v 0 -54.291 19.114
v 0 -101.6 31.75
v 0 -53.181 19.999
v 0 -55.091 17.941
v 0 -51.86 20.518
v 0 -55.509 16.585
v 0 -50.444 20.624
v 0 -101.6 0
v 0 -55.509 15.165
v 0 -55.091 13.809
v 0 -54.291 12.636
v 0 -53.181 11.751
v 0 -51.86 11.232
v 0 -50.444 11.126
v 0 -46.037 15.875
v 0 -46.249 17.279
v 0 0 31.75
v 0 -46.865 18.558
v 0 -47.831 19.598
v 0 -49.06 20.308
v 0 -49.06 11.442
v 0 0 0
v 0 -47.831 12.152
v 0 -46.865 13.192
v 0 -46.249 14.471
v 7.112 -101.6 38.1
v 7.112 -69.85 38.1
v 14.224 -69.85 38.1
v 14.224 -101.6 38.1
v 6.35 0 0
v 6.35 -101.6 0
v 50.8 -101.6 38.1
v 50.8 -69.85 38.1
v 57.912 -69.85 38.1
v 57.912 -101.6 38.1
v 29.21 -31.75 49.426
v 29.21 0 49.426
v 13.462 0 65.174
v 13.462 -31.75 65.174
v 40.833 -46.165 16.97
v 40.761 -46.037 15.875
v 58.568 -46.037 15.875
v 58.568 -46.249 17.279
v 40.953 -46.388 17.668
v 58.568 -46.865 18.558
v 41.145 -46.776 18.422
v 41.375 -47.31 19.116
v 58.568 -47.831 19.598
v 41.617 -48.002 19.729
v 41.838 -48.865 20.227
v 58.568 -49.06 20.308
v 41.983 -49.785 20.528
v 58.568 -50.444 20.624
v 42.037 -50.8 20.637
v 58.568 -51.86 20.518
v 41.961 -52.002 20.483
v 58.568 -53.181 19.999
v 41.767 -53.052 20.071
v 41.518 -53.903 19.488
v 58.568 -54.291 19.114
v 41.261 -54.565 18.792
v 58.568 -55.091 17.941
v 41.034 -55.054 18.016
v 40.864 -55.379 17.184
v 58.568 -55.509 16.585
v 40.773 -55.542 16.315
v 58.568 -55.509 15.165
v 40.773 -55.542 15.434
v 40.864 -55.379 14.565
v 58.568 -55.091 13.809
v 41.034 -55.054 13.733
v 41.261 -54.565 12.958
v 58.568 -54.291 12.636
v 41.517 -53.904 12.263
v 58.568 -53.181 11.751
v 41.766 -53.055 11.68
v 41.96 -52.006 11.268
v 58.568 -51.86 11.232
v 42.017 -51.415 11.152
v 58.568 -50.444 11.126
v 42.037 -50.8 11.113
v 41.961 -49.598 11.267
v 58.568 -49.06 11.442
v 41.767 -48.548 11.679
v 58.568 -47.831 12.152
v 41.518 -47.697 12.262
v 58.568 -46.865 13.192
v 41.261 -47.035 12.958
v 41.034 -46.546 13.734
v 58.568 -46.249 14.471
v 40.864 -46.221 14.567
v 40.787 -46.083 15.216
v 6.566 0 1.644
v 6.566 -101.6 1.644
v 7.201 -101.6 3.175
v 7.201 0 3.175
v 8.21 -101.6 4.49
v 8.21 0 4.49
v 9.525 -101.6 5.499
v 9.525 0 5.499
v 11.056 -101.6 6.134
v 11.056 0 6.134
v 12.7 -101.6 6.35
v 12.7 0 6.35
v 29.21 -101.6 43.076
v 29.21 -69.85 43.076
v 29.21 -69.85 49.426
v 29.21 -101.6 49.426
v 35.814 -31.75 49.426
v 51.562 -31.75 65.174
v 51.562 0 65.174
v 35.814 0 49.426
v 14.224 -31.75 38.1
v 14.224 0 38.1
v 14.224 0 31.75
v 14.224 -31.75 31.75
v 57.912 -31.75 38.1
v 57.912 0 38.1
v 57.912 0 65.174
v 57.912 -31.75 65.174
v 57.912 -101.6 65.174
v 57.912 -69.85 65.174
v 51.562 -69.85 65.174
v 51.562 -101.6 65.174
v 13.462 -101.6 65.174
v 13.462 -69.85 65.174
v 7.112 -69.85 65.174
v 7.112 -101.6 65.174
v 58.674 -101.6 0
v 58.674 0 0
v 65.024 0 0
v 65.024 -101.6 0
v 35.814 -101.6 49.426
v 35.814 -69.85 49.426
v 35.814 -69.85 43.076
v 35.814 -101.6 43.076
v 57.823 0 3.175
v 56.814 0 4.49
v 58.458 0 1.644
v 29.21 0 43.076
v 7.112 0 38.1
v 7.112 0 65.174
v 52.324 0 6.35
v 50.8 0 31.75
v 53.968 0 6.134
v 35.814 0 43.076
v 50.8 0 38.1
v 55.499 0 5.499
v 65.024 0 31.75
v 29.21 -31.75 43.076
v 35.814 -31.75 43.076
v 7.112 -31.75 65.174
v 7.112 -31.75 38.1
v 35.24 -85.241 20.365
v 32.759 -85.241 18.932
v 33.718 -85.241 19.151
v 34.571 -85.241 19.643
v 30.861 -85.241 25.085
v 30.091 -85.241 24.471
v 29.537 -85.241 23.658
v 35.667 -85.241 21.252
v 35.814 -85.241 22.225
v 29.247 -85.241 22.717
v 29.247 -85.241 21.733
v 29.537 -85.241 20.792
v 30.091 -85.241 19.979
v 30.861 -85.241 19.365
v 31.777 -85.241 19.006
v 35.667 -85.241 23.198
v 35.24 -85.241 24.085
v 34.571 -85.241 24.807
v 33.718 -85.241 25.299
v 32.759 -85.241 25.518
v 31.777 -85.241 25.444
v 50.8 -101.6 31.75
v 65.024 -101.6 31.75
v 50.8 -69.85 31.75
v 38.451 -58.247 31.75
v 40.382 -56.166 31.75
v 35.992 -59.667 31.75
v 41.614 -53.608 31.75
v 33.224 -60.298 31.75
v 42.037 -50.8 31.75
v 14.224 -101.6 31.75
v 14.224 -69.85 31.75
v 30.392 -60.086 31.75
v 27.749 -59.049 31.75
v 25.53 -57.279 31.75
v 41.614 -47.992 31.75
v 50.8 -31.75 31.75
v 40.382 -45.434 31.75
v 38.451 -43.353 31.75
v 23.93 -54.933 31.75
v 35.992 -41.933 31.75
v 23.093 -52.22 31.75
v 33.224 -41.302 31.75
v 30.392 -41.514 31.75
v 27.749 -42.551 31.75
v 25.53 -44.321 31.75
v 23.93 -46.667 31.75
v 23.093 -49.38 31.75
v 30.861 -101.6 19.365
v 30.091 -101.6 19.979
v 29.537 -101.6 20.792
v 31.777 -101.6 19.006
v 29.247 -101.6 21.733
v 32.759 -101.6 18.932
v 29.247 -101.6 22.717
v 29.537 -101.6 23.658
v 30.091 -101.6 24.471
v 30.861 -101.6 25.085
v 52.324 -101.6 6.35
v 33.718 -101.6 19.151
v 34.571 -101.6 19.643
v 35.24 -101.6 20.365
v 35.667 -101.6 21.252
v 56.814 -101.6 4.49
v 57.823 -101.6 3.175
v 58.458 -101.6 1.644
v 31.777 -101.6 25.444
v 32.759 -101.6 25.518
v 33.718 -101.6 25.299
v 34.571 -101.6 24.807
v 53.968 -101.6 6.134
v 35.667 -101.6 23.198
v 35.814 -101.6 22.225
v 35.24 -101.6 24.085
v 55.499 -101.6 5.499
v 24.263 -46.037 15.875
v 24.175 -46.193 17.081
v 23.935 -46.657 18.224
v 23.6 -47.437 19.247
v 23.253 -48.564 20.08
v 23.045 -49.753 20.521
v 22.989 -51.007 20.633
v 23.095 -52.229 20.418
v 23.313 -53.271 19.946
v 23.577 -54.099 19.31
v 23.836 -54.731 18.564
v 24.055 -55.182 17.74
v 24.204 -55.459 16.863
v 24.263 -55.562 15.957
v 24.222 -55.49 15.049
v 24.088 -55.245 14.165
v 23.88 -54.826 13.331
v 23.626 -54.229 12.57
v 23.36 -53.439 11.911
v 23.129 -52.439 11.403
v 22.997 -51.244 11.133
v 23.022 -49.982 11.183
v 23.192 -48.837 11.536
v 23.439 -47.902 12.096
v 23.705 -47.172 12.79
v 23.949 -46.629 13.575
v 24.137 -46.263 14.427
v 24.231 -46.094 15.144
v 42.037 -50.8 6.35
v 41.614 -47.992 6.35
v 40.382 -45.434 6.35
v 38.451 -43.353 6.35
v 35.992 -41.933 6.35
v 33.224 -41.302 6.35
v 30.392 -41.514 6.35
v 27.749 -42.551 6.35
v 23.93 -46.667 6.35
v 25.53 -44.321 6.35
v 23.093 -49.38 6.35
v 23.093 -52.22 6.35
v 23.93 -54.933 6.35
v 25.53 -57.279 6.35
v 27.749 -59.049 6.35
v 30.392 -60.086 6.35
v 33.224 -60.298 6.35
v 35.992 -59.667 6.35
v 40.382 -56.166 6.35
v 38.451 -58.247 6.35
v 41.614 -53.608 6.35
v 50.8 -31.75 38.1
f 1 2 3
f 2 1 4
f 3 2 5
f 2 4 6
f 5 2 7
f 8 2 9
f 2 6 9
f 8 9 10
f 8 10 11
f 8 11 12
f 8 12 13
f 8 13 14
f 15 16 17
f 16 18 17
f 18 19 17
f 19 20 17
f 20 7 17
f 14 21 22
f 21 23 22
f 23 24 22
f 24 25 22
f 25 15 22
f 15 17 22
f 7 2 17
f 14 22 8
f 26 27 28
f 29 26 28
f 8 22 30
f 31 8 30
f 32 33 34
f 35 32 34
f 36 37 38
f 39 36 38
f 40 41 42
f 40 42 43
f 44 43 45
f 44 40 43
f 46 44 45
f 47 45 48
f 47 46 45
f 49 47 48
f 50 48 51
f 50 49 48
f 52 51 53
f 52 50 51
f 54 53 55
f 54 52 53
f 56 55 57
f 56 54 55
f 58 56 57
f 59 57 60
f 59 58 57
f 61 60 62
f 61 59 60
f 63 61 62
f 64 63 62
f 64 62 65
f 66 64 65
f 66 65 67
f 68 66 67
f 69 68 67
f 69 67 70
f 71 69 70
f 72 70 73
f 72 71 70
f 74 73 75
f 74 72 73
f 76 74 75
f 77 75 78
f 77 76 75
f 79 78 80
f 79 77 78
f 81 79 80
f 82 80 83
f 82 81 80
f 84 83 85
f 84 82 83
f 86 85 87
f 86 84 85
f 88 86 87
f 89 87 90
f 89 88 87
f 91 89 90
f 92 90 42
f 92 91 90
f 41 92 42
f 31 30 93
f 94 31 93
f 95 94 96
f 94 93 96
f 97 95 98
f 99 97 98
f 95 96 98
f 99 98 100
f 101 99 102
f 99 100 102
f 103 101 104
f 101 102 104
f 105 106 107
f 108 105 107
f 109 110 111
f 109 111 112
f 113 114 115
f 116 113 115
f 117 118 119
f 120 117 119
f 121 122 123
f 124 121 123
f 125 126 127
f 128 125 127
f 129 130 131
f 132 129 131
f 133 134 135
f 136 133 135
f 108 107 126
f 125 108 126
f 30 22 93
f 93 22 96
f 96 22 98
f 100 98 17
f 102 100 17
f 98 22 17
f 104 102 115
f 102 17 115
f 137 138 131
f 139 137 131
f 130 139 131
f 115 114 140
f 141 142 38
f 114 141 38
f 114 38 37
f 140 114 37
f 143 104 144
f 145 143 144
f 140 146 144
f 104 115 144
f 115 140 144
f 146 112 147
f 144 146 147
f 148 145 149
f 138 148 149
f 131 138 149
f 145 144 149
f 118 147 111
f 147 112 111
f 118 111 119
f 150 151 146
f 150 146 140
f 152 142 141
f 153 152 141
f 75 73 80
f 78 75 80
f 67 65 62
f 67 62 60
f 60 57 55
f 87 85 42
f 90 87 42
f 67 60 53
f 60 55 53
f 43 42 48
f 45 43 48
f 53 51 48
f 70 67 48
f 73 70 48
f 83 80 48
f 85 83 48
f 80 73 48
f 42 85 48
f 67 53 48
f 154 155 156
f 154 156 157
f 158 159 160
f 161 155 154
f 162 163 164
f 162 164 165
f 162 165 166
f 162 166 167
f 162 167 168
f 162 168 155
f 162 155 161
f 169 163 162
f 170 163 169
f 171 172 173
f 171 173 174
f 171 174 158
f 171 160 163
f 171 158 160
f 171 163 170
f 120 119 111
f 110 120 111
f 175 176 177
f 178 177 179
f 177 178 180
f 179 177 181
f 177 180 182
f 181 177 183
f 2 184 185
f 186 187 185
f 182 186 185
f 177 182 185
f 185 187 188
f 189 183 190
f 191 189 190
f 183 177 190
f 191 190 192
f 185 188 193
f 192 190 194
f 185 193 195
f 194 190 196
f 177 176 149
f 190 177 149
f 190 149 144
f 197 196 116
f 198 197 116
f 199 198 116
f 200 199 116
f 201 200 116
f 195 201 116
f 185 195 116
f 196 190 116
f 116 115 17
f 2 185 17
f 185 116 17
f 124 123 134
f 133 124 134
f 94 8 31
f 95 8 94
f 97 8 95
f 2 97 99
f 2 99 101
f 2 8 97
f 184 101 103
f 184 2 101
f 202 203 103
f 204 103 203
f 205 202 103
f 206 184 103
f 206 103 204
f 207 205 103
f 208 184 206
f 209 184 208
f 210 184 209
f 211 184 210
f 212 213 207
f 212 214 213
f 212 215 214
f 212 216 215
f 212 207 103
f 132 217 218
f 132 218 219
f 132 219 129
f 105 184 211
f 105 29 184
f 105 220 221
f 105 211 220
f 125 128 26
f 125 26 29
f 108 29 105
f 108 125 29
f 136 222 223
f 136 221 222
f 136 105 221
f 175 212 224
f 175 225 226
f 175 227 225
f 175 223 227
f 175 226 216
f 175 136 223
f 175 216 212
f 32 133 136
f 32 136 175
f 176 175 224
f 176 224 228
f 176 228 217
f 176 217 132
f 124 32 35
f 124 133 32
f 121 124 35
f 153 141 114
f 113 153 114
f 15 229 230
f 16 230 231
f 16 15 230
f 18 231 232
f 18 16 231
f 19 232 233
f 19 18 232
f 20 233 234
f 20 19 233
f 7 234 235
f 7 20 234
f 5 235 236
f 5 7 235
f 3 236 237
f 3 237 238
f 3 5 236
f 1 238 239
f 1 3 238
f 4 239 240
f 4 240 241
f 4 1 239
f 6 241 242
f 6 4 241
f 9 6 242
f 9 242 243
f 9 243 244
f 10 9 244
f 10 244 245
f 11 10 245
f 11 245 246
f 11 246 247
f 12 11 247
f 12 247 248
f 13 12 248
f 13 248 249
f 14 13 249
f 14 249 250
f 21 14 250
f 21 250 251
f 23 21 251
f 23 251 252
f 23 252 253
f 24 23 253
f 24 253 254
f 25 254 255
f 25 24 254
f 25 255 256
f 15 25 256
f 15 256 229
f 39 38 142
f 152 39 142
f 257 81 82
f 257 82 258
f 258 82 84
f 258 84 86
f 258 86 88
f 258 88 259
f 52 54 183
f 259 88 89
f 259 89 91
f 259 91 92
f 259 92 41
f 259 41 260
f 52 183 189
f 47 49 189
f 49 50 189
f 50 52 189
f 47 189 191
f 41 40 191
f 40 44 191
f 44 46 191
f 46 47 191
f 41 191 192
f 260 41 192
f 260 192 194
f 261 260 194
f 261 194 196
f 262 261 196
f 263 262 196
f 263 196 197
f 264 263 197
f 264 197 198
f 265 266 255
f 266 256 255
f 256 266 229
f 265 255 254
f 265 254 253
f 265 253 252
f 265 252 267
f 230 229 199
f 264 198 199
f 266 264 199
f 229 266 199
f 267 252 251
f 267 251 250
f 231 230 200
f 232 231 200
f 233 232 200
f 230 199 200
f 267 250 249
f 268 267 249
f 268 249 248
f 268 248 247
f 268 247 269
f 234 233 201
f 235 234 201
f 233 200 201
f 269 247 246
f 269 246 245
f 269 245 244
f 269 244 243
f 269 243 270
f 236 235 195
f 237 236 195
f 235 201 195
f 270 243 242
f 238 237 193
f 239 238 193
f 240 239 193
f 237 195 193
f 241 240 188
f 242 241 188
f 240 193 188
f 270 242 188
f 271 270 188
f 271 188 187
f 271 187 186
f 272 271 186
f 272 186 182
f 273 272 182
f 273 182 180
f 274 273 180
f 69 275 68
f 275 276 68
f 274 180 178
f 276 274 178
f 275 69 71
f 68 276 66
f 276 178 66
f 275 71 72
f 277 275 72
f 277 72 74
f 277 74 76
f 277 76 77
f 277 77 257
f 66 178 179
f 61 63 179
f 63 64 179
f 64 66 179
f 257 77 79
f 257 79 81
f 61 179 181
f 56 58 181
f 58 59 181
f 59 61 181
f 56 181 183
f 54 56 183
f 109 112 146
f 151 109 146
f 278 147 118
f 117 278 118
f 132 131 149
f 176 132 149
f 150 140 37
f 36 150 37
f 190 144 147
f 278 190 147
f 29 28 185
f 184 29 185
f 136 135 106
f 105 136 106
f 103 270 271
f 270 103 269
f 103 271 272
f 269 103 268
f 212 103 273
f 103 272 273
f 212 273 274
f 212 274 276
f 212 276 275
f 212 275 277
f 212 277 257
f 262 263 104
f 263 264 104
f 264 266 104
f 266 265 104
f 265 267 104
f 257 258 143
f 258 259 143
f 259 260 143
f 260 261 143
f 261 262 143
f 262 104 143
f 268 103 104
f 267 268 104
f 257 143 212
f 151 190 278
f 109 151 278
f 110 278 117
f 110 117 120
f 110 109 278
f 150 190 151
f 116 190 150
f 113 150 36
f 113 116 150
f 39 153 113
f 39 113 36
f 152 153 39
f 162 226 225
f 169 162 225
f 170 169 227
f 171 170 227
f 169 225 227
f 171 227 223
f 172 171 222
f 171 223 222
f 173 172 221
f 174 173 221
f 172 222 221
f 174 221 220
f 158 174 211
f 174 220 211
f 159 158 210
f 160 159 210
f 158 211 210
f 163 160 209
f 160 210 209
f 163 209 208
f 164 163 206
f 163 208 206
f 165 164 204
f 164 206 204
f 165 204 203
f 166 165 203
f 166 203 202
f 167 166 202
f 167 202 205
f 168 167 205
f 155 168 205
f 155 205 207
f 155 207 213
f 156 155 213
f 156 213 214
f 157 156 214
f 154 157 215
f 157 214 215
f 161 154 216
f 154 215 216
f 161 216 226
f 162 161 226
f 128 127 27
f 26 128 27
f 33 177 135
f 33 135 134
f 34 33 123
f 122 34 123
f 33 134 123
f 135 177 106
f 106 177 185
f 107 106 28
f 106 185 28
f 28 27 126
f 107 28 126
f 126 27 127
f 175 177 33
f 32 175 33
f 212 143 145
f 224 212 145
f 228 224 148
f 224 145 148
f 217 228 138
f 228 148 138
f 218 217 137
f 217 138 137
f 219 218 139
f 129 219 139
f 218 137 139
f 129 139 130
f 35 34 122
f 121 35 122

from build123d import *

# Parameters (mm, degrees)
F0_R     = 3.302
F1_DEPTH = 101.6
F2_R     = 3.302
F3_DEPTH = 16.35888
F4_W     = 38.1
F4_H     = 33.4236365795
F4_R     = 4.7625
F5_DEPTH = 58.56755
F6_R     = 9.525
F7_DEPTH = 31.751


with BuildPart() as f1:
    # F0 (on Front) → F1 (new body)
    with BuildSketch(Plane.XZ):
        with BuildLine():
            Line((0, 0), (6.35, 0))
            ThreePointArc((6.35, 0), (8.2098719395, 4.4901280605), (12.7, 6.35))
            Line((12.7, 6.35), (52.324, 6.35))
            ThreePointArc((52.324, 6.35), (56.8141280605, 4.4901280605), (58.674, 0))
            Line((58.674, 0), (65.024, 0))
            Line((65.024, 0), (65.024, 31.75))
            Line((65.024, 31.75), (50.8, 31.75))
            Line((50.8, 31.75), (50.8, 38.1))
            Line((50.8, 38.1), (57.912, 38.1))
            Line((57.912, 38.1), (57.912, 65.1736365795))
            Line((57.912, 65.1736365795), (51.562, 65.1736365795))
            Line((51.562, 65.1736365795), (35.814, 49.4256365795))
            Line((35.814, 49.4256365795), (35.814, 43.0756365795))
            Line((35.814, 43.0756365795), (29.21, 43.0756365795))
            Line((29.21, 43.0756365795), (29.21, 49.4256365795))
            Line((29.21, 49.4256365795), (13.462, 65.1736365795))
            Line((13.462, 65.1736365795), (7.112, 65.1736365795))
            Line((7.112, 65.1736365795), (7.112, 38.1))
            Line((7.112, 38.1), (14.224, 38.1))
            Line((14.224, 38.1), (14.224, 31.75))
            Line((14.224, 31.75), (0, 31.75))
            Line((0, 31.75), (0, 0))
        make_face()
        with Locations((32.512, 22.225)):
            Circle(F0_R, mode=Mode.SUBTRACT)
        with Locations((32.512, 22.225)):
            Circle(F0_R)
    extrude(amount=F1_DEPTH)

    # F2 (on face) → F3 (cut)
    with BuildSketch(Plane.XZ.offset(101.6)):
        with Locations((32.512, 22.225)):
            Circle(F2_R)
    extrude(amount=-F3_DEPTH, mode=Mode.SUBTRACT)

    # F4 (on Right) → F5 (cut)
    with BuildSketch(Plane.YZ):
        with Locations((-50.8, 48.4618182898)):
            Rectangle(F4_W, F4_H)
        with Locations((-50.8, 15.875)):
            Circle(F4_R)
    extrude(amount=F5_DEPTH, mode=Mode.SUBTRACT)

    # F6 (on face) → F7 (cut, through all)
    with BuildSketch(Plane.XY.offset(31.75)):
        with Locations((32.512, -50.8)):
            Circle(F6_R)
    extrude(amount=-F7_DEPTH, mode=Mode.SUBTRACT)


solid = f1.part
